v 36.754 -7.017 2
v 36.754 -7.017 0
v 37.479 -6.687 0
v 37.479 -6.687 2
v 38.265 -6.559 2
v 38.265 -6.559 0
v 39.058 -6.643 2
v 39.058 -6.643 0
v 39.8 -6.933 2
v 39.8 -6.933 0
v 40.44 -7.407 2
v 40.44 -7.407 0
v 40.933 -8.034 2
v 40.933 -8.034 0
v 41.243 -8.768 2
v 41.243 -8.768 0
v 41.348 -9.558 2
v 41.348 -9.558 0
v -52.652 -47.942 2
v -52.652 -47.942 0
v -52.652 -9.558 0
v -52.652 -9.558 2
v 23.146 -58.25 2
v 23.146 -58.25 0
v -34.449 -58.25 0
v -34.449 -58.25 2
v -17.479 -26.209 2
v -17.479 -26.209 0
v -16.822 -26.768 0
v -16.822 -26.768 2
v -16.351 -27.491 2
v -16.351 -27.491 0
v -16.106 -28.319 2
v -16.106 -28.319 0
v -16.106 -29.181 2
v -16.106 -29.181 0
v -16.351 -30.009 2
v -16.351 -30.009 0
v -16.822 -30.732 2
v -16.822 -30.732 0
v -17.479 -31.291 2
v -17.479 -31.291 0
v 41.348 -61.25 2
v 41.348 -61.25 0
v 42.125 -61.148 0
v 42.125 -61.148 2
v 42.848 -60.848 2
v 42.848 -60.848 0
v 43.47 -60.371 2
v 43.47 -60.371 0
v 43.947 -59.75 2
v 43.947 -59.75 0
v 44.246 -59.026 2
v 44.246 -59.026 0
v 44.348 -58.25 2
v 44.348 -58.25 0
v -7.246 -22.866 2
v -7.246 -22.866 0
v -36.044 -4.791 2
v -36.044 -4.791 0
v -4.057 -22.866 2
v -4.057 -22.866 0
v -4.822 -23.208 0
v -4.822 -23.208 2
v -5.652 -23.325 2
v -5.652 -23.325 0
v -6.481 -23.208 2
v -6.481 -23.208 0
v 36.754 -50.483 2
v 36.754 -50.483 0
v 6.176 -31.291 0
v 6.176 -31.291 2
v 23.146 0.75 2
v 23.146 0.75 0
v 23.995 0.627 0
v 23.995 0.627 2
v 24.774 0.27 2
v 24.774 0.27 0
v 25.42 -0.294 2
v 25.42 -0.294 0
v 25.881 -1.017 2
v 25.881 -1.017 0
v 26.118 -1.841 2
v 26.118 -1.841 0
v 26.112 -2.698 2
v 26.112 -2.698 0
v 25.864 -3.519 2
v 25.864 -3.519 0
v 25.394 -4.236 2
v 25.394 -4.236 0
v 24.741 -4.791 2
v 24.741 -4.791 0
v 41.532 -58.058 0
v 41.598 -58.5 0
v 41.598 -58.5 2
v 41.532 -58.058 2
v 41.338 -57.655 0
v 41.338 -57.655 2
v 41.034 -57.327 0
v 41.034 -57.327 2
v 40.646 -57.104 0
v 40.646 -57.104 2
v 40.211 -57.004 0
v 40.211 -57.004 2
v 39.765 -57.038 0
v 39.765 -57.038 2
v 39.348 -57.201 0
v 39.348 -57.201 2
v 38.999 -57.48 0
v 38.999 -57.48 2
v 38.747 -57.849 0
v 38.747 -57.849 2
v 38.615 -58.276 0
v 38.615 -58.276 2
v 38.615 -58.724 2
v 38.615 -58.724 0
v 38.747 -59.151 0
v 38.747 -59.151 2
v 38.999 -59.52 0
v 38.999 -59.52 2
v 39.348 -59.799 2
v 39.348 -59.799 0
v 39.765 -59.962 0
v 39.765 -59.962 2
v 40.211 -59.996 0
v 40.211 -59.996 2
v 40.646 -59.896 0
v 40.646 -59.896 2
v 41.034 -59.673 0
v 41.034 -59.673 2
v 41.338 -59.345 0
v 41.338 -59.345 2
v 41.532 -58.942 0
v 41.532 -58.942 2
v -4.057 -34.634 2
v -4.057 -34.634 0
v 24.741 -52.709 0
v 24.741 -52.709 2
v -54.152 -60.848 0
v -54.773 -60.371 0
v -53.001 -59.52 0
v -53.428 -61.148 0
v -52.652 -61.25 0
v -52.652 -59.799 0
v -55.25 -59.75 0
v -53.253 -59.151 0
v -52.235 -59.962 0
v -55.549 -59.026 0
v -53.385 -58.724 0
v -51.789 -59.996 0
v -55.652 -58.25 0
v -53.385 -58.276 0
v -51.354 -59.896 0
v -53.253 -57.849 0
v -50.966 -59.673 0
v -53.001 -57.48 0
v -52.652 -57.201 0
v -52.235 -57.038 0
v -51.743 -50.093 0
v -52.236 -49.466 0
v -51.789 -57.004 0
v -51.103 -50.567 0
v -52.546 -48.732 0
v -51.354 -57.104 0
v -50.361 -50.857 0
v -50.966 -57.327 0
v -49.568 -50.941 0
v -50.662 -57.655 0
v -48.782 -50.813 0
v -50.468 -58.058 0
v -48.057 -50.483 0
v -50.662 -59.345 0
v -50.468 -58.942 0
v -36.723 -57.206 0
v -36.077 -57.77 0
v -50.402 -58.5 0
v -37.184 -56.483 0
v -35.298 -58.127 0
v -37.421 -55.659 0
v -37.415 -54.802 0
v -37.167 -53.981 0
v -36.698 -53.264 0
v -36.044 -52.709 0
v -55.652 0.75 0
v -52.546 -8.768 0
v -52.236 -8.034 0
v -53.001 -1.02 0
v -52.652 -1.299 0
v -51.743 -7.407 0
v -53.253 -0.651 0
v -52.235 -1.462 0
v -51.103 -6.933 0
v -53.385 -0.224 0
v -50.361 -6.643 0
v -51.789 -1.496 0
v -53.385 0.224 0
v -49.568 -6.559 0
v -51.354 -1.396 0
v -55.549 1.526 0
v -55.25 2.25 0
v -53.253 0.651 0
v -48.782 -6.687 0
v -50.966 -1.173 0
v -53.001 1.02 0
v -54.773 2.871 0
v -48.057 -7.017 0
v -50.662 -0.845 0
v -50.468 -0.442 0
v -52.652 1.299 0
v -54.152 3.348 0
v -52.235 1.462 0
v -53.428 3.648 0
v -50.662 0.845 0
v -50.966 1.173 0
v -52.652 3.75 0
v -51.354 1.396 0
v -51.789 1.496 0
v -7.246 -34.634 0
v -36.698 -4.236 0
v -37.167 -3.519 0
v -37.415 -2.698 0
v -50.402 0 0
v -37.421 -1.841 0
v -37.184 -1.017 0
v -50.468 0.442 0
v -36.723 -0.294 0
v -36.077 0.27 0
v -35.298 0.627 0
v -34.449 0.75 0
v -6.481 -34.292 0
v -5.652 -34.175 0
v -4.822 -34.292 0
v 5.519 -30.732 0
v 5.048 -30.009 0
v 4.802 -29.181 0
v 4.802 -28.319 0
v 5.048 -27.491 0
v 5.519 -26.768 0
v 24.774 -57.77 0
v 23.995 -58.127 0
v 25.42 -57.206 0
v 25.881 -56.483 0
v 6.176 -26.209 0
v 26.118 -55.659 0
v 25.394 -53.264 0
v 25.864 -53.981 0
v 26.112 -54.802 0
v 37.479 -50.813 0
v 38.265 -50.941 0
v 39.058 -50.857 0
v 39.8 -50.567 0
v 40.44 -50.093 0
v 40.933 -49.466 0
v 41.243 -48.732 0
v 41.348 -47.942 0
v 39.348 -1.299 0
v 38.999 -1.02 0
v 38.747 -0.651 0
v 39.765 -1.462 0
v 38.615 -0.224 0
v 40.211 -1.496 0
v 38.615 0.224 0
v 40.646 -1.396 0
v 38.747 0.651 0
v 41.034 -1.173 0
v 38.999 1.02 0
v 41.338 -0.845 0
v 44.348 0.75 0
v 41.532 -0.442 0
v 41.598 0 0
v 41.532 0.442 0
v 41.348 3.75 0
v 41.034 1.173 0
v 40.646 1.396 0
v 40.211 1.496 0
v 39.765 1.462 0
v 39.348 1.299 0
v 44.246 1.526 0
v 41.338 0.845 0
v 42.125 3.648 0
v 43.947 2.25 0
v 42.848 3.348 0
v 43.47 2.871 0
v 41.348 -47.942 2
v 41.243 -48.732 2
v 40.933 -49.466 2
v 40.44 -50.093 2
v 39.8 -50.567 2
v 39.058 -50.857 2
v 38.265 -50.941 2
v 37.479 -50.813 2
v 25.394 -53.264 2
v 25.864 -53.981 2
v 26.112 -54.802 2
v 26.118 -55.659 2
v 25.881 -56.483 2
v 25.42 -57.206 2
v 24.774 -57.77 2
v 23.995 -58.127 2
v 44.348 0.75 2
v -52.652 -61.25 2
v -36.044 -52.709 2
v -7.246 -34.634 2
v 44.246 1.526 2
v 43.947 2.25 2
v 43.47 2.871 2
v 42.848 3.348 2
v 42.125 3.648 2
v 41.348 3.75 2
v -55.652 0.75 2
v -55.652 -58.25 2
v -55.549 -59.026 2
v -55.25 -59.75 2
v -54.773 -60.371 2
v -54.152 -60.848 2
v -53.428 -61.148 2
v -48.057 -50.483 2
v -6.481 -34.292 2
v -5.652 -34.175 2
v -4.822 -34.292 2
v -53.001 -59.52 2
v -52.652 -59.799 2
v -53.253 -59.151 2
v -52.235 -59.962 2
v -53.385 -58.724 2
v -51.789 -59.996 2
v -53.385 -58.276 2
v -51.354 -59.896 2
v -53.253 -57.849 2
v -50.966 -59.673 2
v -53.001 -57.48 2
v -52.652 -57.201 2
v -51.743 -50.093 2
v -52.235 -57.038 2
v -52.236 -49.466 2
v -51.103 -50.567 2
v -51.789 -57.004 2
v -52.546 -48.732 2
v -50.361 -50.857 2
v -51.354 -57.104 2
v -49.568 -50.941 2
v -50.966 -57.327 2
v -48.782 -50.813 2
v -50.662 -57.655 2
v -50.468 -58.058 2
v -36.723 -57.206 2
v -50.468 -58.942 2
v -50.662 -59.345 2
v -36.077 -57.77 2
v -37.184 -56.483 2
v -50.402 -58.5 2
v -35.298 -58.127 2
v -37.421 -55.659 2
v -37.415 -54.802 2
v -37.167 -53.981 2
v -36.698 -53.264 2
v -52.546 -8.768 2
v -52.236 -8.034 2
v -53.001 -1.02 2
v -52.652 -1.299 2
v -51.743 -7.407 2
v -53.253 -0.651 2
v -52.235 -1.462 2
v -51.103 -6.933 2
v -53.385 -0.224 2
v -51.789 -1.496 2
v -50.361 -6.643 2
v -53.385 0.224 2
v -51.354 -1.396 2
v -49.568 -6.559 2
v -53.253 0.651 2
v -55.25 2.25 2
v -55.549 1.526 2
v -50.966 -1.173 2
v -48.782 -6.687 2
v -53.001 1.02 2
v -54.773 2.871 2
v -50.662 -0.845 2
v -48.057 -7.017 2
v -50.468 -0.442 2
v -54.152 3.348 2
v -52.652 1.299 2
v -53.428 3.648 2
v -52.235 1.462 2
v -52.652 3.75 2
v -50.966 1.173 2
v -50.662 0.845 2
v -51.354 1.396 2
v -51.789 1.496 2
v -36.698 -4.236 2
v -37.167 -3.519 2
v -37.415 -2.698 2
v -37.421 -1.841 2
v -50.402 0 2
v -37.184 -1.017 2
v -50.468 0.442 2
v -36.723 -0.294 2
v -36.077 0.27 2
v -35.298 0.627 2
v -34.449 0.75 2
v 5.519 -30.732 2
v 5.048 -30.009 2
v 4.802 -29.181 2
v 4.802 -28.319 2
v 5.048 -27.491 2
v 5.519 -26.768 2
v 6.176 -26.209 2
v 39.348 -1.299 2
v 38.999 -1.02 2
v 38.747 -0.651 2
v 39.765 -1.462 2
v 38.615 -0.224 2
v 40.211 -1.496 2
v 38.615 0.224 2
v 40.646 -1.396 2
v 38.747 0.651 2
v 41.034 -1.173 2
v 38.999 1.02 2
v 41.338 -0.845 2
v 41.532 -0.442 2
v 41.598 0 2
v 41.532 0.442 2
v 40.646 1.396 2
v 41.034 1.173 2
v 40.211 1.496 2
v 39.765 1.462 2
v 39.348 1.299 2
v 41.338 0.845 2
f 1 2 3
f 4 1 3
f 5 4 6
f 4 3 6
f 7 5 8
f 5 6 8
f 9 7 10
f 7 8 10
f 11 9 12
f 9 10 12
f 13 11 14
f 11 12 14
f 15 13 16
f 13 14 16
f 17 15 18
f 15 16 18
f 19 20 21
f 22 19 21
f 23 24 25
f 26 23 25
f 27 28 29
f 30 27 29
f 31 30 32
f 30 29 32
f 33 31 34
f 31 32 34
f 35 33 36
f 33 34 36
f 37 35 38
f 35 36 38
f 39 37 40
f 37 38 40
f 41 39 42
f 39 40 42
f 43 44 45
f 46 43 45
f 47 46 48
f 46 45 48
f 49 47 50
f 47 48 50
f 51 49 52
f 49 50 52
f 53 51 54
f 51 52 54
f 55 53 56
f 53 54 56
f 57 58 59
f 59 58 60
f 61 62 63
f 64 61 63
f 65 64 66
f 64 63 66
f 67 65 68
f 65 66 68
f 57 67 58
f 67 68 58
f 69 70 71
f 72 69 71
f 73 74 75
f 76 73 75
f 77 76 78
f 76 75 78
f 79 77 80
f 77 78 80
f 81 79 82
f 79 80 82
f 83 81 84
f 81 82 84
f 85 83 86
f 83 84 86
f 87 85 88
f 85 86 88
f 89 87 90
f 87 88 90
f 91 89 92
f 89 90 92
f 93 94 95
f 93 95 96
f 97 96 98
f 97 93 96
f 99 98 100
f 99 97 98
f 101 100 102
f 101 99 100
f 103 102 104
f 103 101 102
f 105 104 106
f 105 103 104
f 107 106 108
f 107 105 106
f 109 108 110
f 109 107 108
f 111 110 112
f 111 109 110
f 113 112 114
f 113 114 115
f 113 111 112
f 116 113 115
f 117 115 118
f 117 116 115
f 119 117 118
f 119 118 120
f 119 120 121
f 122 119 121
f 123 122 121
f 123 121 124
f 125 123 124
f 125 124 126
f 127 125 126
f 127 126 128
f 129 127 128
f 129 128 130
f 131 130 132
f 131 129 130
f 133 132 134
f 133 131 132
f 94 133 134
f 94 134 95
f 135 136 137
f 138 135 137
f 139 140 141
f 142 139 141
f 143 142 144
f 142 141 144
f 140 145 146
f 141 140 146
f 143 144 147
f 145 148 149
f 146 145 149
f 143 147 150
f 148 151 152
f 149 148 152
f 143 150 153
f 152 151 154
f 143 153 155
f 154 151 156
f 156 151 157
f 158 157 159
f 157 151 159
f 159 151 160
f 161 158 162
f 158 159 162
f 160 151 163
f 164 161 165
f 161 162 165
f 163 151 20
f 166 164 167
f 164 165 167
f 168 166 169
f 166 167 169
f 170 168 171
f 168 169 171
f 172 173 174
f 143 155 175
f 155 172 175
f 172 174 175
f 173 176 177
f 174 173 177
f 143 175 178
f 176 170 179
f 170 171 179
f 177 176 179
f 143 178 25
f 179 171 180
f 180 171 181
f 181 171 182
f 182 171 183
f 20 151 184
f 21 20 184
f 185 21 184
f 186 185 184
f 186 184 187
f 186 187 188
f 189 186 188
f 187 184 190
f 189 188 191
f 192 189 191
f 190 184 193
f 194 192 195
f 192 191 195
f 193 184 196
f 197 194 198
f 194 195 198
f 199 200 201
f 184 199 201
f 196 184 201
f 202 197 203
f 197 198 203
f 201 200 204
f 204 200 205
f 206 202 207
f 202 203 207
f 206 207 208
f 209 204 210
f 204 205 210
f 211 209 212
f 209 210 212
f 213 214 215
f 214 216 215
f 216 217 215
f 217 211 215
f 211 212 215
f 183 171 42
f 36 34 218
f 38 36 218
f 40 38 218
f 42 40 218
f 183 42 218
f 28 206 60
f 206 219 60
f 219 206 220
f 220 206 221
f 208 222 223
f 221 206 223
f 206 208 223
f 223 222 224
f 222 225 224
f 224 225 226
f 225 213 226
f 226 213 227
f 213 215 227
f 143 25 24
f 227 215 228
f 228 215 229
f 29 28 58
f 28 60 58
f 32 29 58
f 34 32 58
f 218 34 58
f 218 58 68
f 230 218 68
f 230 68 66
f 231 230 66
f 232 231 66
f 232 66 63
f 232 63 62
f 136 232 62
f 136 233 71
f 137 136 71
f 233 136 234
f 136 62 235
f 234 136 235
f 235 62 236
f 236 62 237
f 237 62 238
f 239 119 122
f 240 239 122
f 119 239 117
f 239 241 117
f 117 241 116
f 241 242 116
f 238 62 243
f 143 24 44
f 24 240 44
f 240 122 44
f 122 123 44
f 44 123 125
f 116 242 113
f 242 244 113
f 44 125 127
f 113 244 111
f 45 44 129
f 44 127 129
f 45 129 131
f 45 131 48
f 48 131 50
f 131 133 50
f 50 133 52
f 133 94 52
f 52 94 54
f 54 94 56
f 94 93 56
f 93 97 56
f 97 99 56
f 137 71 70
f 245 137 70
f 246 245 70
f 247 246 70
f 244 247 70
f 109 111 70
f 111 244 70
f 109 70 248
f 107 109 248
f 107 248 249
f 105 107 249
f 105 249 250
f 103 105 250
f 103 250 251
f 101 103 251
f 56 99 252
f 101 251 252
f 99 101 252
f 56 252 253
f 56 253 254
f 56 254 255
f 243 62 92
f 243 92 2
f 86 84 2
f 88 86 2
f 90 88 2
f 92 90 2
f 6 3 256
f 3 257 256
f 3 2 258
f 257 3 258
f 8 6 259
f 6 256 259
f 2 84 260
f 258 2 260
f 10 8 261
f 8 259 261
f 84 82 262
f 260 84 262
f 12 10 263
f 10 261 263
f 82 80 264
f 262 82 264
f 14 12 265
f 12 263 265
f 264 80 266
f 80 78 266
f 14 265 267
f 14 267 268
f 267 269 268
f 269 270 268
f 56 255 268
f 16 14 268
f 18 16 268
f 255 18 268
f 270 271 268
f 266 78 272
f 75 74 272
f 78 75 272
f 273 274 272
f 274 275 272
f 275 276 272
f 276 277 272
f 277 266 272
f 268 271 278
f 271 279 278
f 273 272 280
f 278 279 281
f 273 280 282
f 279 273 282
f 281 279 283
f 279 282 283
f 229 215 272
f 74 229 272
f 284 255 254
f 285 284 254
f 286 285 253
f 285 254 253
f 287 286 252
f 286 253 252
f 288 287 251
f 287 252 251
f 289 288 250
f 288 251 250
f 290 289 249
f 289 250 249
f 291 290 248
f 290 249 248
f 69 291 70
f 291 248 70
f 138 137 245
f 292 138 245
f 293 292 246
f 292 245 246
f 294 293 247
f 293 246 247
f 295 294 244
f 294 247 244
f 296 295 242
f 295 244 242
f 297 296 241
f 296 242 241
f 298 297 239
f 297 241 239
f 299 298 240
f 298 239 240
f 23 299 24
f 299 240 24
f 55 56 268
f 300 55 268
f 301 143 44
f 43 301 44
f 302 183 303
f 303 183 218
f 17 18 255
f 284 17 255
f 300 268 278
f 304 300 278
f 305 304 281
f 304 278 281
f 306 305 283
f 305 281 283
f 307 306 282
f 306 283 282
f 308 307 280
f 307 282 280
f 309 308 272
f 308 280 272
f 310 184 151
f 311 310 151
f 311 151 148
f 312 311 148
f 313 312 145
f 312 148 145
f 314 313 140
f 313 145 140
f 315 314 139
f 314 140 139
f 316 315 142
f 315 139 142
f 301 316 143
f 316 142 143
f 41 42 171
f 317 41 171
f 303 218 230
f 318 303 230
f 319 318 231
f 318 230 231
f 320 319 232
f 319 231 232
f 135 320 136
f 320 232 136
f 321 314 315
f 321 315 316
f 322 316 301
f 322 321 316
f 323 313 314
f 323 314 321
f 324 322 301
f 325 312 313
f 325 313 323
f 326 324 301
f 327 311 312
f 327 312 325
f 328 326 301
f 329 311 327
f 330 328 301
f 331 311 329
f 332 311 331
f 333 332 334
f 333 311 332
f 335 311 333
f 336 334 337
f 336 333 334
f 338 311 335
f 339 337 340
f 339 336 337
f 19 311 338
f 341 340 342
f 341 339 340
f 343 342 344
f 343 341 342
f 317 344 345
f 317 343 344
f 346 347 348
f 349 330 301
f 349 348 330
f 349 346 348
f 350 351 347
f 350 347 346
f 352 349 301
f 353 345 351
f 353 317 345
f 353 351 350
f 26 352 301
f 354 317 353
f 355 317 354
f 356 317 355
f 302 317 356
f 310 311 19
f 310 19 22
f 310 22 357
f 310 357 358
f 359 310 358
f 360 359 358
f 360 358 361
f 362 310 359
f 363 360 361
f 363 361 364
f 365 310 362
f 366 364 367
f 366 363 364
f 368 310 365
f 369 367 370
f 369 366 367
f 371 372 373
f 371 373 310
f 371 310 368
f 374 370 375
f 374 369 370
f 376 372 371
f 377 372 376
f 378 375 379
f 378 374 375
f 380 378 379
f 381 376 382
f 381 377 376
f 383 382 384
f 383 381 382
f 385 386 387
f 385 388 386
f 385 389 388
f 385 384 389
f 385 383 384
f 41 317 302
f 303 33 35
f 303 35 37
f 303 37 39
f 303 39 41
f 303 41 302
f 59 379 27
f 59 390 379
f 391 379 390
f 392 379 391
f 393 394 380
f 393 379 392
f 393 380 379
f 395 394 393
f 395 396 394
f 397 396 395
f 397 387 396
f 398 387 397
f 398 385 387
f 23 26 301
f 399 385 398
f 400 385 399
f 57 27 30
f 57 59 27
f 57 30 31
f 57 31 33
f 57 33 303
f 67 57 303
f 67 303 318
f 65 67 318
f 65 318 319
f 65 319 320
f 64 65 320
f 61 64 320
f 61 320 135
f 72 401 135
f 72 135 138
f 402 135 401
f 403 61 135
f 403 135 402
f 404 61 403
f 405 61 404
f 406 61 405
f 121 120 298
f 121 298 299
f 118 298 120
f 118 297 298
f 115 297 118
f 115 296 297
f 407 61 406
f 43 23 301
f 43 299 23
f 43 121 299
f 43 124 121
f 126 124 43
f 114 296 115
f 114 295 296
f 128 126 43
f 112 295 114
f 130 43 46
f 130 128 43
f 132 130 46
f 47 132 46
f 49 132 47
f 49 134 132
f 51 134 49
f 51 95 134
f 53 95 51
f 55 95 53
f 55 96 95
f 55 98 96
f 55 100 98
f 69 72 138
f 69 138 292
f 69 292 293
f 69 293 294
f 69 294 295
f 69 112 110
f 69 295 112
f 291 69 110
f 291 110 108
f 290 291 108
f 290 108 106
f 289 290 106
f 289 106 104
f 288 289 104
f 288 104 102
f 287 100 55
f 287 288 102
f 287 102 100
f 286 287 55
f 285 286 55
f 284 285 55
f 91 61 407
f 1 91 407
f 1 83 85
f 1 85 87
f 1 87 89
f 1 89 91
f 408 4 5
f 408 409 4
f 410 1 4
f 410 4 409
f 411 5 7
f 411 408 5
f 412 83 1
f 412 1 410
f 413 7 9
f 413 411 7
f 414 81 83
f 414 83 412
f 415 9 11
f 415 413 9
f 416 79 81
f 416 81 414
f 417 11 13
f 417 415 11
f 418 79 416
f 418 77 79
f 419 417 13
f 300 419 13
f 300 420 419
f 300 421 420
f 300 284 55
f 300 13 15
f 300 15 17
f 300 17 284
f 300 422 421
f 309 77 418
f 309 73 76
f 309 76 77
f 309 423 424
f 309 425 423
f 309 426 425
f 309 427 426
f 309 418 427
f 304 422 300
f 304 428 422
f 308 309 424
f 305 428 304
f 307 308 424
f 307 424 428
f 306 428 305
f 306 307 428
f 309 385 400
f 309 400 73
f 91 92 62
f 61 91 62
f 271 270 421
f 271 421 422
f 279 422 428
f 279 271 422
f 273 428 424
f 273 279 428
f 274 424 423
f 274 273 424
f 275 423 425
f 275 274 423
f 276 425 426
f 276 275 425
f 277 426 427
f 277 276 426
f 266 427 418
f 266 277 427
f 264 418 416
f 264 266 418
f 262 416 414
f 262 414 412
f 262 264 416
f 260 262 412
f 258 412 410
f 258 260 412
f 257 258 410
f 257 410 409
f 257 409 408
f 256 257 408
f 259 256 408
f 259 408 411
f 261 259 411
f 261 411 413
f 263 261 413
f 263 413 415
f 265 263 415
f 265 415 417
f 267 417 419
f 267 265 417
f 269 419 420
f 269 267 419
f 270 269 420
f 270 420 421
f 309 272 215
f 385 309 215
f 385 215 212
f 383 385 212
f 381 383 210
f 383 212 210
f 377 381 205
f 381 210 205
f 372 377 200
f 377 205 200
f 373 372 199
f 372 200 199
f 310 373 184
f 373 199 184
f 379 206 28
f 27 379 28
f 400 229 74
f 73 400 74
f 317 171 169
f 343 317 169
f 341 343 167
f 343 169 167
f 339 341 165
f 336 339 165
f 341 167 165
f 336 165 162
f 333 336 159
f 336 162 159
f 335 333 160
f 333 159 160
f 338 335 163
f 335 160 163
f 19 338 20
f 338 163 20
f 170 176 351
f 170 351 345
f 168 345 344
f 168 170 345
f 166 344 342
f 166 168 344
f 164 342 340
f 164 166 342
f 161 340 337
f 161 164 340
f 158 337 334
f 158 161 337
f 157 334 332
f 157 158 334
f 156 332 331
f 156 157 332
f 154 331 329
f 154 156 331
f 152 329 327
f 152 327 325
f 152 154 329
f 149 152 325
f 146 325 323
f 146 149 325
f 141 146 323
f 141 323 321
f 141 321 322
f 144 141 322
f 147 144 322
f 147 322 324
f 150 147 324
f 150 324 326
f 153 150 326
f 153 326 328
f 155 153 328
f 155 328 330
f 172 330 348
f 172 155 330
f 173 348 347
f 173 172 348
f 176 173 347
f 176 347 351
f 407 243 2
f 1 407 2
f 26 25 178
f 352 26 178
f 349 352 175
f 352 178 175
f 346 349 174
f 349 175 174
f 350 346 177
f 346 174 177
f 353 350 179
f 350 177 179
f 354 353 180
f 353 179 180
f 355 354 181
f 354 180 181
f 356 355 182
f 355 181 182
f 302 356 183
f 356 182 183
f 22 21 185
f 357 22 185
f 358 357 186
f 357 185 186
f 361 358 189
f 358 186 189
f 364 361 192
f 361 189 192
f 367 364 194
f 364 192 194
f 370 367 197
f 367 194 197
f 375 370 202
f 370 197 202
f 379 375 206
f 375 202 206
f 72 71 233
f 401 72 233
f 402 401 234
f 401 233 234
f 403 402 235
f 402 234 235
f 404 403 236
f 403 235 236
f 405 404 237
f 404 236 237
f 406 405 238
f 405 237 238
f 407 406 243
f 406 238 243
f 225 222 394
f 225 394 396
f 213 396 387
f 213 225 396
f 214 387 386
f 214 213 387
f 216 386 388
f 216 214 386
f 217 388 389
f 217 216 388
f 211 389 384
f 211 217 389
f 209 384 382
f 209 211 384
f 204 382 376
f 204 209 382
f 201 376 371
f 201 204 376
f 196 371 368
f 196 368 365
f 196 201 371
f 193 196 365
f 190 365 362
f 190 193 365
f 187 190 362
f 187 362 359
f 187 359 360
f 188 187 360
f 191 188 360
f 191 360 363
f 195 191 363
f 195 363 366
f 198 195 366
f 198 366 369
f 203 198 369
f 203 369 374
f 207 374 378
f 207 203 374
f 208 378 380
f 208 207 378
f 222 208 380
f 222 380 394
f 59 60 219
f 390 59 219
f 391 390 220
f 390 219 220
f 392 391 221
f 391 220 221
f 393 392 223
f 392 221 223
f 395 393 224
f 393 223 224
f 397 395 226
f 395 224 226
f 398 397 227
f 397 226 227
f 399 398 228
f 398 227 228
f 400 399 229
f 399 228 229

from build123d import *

# Parameters (mm, degrees)
F0_R     = 1.5
F1_DEPTH = 2


with BuildPart() as f1:
    # F0 (on Top) → F1 (new body)
    with BuildSketch(Plane.XY):
        with BuildLine():
            Line((-49.651527, 3.75), (-52.651527, 3.75))
            ThreePointArc((-52.651527, 3.75), (-54.772848, 2.87132), (-55.651527, 0.75))
            Line((-55.651527, 0.75), (-55.651527, -2.25))
            Line((-55.651527, -2.25), (-55.651527, -55.25))
            Line((-55.651527, -55.25), (-55.651527, -58.25))
            ThreePointArc((-55.651527, -58.25), (-54.772848, -60.37132), (-52.651527, -61.25))
            Line((-52.651527, -61.25), (-49.651527, -61.25))
            Line((-49.651527, -61.25), (38.348473, -61.25))
            Line((38.348473, -61.25), (41.348473, -61.25))
            ThreePointArc((41.348473, -61.25), (43.469793, -60.37132), (44.348473, -58.25))
            Line((44.348473, -58.25), (44.348473, -55.25))
            Line((44.348473, -55.25), (44.348473, -2.25))
            Line((44.348473, -2.25), (44.348473, 0.75))
            ThreePointArc((44.348473, 0.75), (43.469793, 2.87132), (41.348473, 3.75))
            Line((41.348473, 3.75), (38.348473, 3.75))
            Line((38.348473, 3.75), (-49.651527, 3.75))
        make_face()
        with Locations((-51.901527, -58.5)):
            Circle(F0_R, mode=Mode.SUBTRACT)
        with BuildLine():
            ThreePointArc((-34.449054, -58.25), (-37.332009, -56.079801), (-36.043907, -52.709047))
            Line((-36.043907, -52.709047), (-7.246381, -34.634004))
            ThreePointArc((-7.246381, -34.634004), (-5.651527, -34.174957), (-4.056674, -34.634004))
            Line((-4.056674, -34.634004), (24.740853, -52.709047))
            ThreePointArc((24.740853, -52.709047), (26.028954, -56.079801), (23.145999, -58.25))
            Line((23.145999, -58.25), (-34.449054, -58.25))
        make_face(mode=Mode.SUBTRACT)
        with Locations((40.098473, -58.5)):
            Circle(F0_R, mode=Mode.SUBTRACT)
        with BuildLine():
            ThreePointArc((-52.651527, -9.557936), (-51.103326, -6.93262), (-48.056674, -7.016983))
            Line((-48.056674, -7.016983), (-17.479486, -26.209047))
            ThreePointArc((-17.479486, -26.209047), (-16.07434, -28.75), (-17.479486, -31.290953))
            Line((-17.479486, -31.290953), (-48.056674, -50.483017))
            ThreePointArc((-48.056674, -50.483017), (-51.103326, -50.56738), (-52.651527, -47.942064))
            Line((-52.651527, -47.942064), (-52.651527, -9.557936))
        make_face(mode=Mode.SUBTRACT)
        with Locations((-51.901527, 0)):
            Circle(F0_R, mode=Mode.SUBTRACT)
        with BuildLine():
            Line((36.753619, -50.483017), (6.176432, -31.290953))
            ThreePointArc((6.176432, -31.290953), (4.771285, -28.75), (6.176432, -26.209047))
            Line((6.176432, -26.209047), (36.753619, -7.016983))
            ThreePointArc((36.753619, -7.016983), (39.800272, -6.93262), (41.348473, -9.557936))
            Line((41.348473, -9.557936), (41.348473, -47.942064))
            ThreePointArc((41.348473, -47.942064), (39.800272, -50.56738), (36.753619, -50.483017))
        make_face(mode=Mode.SUBTRACT)
        with BuildLine():
            Line((-7.246381, -22.865996), (-36.043907, -4.790953))
            ThreePointArc((-36.043907, -4.790953), (-37.332009, -1.420199), (-34.449054, 0.75))
            Line((-34.449054, 0.75), (23.145999, 0.75))
            ThreePointArc((23.145999, 0.75), (26.028954, -1.420199), (24.740853, -4.790953))
            Line((24.740853, -4.790953), (-4.056674, -22.865996))
            ThreePointArc((-4.056674, -22.865996), (-5.651527, -23.325043), (-7.246381, -22.865996))
        make_face(mode=Mode.SUBTRACT)
        with Locations((40.098473, 0)):
            Circle(F0_R, mode=Mode.SUBTRACT)
    extrude(amount=F1_DEPTH)


solid = f1.part
